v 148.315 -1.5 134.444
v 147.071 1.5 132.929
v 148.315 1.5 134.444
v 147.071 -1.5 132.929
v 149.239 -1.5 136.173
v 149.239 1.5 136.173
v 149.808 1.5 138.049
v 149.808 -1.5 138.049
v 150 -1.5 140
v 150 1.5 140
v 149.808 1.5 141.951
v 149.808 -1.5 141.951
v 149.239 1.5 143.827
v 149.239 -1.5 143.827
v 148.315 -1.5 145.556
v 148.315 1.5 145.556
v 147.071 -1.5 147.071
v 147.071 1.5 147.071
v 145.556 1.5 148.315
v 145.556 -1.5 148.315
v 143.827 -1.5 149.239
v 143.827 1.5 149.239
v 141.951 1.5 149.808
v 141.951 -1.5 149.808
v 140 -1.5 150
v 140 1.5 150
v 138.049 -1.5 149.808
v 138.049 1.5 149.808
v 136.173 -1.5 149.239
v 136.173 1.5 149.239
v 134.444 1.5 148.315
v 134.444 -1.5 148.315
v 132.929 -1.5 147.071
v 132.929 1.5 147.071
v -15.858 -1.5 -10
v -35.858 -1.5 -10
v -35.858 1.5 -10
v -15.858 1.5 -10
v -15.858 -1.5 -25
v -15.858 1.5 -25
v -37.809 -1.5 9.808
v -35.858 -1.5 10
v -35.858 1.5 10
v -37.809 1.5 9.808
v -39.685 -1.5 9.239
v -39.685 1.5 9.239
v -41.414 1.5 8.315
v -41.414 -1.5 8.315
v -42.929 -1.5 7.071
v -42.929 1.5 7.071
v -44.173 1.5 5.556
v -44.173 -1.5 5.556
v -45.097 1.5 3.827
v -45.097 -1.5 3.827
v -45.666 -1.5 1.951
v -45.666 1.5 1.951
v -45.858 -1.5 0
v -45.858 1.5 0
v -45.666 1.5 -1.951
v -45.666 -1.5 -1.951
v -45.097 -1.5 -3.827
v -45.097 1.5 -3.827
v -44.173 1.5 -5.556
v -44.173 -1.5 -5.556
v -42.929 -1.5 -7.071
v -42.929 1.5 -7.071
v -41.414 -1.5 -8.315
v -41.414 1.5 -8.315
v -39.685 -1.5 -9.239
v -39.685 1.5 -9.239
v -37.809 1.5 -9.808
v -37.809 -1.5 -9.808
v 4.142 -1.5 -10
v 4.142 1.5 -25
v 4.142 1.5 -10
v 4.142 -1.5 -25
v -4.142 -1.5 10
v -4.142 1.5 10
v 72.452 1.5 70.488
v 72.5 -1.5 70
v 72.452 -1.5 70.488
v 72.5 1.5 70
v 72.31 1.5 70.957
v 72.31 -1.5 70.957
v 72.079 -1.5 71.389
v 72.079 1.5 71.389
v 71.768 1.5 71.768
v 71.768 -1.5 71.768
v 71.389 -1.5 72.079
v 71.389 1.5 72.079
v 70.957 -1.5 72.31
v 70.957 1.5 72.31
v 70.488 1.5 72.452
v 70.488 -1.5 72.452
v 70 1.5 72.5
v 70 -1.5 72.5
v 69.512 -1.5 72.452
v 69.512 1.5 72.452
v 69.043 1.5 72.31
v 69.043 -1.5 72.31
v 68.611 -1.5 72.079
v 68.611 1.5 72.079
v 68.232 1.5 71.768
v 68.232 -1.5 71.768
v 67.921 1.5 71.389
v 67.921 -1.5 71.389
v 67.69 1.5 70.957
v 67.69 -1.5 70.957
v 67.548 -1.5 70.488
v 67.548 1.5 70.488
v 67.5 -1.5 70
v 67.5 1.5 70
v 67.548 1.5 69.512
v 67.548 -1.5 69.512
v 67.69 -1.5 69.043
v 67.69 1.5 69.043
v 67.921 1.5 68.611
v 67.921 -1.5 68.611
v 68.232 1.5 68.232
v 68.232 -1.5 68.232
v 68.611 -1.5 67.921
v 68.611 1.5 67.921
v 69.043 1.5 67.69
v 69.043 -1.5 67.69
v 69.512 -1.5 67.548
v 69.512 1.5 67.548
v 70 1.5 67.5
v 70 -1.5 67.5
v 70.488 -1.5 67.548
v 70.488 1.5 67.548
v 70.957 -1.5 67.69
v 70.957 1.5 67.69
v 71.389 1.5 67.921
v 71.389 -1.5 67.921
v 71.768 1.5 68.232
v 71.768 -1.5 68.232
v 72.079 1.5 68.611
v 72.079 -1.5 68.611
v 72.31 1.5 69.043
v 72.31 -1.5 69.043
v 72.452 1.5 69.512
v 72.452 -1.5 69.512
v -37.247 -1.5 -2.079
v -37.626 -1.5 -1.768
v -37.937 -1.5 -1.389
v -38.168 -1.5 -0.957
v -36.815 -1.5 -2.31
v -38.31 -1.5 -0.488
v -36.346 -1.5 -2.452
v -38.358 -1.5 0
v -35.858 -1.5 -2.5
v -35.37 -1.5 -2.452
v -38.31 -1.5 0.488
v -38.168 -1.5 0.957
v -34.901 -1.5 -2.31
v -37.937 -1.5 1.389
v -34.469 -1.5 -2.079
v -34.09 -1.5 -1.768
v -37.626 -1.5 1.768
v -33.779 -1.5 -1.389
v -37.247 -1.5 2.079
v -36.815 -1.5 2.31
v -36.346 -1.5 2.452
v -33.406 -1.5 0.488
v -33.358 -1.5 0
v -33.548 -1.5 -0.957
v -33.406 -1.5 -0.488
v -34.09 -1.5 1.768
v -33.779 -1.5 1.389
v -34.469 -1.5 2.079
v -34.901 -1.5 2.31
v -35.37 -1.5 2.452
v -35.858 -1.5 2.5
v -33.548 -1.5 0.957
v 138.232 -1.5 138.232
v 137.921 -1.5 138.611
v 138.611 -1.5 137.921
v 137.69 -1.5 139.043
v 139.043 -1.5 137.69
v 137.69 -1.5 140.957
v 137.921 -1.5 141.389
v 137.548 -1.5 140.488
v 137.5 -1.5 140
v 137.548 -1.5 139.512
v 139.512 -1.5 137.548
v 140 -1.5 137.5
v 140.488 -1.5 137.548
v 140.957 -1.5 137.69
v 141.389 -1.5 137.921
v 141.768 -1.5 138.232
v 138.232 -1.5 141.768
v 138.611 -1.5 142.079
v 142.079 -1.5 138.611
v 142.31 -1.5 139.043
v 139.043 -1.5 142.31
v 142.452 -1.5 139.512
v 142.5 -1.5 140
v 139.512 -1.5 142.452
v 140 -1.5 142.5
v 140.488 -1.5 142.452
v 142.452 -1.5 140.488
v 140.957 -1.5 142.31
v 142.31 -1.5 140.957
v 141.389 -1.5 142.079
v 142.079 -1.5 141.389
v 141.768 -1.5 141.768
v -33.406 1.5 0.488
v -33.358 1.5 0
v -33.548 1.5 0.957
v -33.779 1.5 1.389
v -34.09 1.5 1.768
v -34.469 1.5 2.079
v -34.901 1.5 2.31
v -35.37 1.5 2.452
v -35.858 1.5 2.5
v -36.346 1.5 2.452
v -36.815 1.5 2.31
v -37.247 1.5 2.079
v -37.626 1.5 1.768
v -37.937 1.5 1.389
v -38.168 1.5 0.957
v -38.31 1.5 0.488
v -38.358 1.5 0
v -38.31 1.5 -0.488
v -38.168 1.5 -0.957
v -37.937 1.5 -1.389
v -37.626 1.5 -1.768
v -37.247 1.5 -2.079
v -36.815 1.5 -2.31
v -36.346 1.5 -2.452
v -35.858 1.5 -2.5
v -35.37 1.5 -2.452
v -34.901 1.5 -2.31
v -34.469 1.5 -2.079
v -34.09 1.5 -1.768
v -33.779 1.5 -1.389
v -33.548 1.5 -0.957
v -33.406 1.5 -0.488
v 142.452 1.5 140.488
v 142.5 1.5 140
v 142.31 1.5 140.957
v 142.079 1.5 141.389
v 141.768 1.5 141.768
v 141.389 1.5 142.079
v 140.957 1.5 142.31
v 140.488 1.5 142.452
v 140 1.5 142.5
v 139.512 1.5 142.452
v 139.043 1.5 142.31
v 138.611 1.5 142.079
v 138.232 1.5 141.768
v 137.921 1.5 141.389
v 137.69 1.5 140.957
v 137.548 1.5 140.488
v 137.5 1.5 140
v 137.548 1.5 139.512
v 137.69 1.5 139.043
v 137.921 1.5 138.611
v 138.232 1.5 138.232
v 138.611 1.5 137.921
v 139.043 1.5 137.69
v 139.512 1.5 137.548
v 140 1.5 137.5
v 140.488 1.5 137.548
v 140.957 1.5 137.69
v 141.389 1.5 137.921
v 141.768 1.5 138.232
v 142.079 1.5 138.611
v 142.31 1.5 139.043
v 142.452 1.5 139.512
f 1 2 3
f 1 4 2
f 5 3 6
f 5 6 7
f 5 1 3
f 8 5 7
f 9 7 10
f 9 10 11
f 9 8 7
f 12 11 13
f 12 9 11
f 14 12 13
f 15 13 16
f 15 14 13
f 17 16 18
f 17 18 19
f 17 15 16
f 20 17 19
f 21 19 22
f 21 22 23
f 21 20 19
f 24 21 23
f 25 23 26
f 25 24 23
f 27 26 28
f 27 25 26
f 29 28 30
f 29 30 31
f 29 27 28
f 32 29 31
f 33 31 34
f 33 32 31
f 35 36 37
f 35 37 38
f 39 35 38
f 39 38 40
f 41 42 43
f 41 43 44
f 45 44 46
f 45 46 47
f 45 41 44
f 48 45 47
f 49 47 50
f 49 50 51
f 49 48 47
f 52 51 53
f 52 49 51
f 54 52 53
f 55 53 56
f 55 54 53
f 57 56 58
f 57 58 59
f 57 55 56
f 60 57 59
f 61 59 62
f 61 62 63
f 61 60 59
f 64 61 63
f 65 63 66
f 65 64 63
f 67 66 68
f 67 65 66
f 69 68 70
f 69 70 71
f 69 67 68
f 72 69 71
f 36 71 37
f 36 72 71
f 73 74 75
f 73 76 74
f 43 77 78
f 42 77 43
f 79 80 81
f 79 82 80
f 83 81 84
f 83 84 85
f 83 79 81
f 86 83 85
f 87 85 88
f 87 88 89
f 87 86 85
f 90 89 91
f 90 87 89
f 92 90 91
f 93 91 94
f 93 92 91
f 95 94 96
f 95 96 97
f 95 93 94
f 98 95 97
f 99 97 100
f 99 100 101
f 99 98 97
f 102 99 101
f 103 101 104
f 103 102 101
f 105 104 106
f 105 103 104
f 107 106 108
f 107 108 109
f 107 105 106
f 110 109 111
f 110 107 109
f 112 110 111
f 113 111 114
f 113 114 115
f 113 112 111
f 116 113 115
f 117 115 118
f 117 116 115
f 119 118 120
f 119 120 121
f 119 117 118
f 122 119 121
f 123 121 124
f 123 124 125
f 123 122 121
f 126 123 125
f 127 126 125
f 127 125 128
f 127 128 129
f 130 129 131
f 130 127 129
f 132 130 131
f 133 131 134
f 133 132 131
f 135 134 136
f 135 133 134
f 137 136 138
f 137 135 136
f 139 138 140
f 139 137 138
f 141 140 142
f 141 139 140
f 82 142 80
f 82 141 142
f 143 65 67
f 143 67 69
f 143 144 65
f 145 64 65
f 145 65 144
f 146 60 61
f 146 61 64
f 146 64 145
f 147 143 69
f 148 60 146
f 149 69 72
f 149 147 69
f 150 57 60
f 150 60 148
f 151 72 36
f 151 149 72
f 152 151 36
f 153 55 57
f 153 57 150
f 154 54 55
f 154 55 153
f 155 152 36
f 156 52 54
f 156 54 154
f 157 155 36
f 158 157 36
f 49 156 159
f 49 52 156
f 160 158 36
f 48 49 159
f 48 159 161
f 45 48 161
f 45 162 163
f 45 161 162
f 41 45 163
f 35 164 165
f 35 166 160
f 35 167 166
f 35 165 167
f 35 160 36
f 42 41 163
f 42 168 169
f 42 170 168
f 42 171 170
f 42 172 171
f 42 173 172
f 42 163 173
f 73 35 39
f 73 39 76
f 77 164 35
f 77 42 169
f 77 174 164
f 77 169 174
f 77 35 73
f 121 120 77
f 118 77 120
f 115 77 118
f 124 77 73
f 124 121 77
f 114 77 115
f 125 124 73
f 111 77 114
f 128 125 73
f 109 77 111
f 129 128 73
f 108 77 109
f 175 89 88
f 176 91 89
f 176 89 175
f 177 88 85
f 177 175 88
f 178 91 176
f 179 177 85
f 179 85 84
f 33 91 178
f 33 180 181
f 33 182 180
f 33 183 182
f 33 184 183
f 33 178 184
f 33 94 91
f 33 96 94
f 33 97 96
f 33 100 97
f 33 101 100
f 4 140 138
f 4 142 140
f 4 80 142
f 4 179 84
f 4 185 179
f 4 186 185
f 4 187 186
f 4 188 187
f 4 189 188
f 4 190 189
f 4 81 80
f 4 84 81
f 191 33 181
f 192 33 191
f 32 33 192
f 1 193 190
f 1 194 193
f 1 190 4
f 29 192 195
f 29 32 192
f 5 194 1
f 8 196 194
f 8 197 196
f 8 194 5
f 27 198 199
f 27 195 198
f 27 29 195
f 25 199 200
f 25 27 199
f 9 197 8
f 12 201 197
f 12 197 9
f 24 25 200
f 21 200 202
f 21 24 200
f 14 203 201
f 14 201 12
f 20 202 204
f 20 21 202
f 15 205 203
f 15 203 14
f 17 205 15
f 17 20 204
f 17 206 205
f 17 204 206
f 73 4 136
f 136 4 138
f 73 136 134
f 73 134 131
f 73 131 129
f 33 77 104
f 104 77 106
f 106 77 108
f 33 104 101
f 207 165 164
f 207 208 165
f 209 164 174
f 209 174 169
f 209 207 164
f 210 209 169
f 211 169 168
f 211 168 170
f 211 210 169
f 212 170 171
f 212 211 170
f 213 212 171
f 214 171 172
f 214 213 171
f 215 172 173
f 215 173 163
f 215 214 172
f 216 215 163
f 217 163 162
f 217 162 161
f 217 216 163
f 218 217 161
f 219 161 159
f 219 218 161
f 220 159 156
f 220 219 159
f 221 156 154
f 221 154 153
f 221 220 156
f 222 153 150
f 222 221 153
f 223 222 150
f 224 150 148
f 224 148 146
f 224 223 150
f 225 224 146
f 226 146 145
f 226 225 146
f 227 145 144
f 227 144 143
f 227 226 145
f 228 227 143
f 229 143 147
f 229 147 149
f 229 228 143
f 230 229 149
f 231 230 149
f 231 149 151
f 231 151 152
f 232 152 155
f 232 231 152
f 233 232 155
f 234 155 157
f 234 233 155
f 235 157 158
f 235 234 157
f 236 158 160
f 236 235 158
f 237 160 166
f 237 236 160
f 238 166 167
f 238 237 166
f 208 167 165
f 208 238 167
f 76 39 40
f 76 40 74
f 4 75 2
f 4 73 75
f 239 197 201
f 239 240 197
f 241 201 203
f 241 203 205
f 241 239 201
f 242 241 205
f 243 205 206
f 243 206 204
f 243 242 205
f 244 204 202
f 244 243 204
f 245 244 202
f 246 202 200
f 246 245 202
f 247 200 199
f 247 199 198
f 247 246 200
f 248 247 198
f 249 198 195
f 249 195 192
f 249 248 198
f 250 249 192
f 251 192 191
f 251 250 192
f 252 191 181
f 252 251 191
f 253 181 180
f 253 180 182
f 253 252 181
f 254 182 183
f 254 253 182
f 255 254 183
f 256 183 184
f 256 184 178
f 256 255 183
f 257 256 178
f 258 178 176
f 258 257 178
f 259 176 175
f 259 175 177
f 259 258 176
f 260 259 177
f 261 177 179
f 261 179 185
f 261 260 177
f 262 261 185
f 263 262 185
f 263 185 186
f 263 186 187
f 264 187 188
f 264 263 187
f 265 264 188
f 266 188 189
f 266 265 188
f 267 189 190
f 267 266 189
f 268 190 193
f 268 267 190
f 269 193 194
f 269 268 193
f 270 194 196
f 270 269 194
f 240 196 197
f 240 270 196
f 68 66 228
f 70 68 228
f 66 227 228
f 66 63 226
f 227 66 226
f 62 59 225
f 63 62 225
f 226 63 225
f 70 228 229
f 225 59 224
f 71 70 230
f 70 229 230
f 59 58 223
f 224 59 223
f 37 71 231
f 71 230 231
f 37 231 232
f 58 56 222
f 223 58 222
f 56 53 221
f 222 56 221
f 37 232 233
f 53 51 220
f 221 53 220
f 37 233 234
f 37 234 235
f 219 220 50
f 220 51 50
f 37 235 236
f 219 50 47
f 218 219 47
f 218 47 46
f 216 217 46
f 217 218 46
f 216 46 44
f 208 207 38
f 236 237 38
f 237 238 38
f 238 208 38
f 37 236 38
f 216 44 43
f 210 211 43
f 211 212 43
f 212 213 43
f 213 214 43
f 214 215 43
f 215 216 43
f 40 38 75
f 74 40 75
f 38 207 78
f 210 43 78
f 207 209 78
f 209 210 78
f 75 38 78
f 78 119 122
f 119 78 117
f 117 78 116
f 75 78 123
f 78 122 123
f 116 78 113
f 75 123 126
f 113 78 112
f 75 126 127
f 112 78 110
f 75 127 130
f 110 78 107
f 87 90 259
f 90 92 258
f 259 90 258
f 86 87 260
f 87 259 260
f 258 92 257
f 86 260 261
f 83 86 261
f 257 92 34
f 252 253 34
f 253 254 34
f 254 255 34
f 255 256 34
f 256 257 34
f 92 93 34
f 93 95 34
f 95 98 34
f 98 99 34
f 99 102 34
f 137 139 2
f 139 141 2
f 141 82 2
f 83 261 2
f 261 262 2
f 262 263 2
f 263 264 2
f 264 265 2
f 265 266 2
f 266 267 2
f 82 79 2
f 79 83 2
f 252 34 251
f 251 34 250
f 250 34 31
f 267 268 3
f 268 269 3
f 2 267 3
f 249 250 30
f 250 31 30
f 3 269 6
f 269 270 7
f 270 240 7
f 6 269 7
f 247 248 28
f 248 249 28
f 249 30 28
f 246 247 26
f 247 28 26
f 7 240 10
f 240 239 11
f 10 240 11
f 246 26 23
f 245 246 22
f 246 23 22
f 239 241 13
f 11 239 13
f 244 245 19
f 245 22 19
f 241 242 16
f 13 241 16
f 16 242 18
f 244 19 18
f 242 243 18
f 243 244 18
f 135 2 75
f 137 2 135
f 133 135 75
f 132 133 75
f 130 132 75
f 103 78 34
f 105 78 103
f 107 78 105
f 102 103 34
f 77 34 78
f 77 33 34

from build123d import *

# Parameters (mm, degrees)
F0_R     = 2.5
F1_DEPTH = 1.5


with BuildPart() as f1:
    # F0 (on Front) → F1 (new body, symmetric)
    with BuildSketch(Plane.XZ):
        with BuildLine():
            Line((-4.142136, 10), (-35.857864, 10))
            ThreePointArc((-35.857864, 10), (-45.857864, 0), (-35.857864, -10))
            Line((-35.857864, -10), (-15.857864, -10))
            Line((-15.857864, -10), (-15.857864, -25))
            Line((-15.857864, -25), (4.142136, -25))
            Line((4.142136, -25), (4.142136, -10))
            Line((4.142136, -10), (147.071068, 132.928932))
            ThreePointArc((147.071068, 132.928932), (147.071068, 147.071068), (132.928932, 147.071068))
            Line((132.928932, 147.071068), (-4.142136, 10))
        make_face()
        with Locations((-35.857864, 0)):
            Circle(F0_R, mode=Mode.SUBTRACT)
        with Locations((70, 70)):
            Circle(F0_R, mode=Mode.SUBTRACT)
        with Locations((140, 140)):
            Circle(F0_R, mode=Mode.SUBTRACT)
    extrude(amount=F1_DEPTH, both=True)


solid = f1.part
